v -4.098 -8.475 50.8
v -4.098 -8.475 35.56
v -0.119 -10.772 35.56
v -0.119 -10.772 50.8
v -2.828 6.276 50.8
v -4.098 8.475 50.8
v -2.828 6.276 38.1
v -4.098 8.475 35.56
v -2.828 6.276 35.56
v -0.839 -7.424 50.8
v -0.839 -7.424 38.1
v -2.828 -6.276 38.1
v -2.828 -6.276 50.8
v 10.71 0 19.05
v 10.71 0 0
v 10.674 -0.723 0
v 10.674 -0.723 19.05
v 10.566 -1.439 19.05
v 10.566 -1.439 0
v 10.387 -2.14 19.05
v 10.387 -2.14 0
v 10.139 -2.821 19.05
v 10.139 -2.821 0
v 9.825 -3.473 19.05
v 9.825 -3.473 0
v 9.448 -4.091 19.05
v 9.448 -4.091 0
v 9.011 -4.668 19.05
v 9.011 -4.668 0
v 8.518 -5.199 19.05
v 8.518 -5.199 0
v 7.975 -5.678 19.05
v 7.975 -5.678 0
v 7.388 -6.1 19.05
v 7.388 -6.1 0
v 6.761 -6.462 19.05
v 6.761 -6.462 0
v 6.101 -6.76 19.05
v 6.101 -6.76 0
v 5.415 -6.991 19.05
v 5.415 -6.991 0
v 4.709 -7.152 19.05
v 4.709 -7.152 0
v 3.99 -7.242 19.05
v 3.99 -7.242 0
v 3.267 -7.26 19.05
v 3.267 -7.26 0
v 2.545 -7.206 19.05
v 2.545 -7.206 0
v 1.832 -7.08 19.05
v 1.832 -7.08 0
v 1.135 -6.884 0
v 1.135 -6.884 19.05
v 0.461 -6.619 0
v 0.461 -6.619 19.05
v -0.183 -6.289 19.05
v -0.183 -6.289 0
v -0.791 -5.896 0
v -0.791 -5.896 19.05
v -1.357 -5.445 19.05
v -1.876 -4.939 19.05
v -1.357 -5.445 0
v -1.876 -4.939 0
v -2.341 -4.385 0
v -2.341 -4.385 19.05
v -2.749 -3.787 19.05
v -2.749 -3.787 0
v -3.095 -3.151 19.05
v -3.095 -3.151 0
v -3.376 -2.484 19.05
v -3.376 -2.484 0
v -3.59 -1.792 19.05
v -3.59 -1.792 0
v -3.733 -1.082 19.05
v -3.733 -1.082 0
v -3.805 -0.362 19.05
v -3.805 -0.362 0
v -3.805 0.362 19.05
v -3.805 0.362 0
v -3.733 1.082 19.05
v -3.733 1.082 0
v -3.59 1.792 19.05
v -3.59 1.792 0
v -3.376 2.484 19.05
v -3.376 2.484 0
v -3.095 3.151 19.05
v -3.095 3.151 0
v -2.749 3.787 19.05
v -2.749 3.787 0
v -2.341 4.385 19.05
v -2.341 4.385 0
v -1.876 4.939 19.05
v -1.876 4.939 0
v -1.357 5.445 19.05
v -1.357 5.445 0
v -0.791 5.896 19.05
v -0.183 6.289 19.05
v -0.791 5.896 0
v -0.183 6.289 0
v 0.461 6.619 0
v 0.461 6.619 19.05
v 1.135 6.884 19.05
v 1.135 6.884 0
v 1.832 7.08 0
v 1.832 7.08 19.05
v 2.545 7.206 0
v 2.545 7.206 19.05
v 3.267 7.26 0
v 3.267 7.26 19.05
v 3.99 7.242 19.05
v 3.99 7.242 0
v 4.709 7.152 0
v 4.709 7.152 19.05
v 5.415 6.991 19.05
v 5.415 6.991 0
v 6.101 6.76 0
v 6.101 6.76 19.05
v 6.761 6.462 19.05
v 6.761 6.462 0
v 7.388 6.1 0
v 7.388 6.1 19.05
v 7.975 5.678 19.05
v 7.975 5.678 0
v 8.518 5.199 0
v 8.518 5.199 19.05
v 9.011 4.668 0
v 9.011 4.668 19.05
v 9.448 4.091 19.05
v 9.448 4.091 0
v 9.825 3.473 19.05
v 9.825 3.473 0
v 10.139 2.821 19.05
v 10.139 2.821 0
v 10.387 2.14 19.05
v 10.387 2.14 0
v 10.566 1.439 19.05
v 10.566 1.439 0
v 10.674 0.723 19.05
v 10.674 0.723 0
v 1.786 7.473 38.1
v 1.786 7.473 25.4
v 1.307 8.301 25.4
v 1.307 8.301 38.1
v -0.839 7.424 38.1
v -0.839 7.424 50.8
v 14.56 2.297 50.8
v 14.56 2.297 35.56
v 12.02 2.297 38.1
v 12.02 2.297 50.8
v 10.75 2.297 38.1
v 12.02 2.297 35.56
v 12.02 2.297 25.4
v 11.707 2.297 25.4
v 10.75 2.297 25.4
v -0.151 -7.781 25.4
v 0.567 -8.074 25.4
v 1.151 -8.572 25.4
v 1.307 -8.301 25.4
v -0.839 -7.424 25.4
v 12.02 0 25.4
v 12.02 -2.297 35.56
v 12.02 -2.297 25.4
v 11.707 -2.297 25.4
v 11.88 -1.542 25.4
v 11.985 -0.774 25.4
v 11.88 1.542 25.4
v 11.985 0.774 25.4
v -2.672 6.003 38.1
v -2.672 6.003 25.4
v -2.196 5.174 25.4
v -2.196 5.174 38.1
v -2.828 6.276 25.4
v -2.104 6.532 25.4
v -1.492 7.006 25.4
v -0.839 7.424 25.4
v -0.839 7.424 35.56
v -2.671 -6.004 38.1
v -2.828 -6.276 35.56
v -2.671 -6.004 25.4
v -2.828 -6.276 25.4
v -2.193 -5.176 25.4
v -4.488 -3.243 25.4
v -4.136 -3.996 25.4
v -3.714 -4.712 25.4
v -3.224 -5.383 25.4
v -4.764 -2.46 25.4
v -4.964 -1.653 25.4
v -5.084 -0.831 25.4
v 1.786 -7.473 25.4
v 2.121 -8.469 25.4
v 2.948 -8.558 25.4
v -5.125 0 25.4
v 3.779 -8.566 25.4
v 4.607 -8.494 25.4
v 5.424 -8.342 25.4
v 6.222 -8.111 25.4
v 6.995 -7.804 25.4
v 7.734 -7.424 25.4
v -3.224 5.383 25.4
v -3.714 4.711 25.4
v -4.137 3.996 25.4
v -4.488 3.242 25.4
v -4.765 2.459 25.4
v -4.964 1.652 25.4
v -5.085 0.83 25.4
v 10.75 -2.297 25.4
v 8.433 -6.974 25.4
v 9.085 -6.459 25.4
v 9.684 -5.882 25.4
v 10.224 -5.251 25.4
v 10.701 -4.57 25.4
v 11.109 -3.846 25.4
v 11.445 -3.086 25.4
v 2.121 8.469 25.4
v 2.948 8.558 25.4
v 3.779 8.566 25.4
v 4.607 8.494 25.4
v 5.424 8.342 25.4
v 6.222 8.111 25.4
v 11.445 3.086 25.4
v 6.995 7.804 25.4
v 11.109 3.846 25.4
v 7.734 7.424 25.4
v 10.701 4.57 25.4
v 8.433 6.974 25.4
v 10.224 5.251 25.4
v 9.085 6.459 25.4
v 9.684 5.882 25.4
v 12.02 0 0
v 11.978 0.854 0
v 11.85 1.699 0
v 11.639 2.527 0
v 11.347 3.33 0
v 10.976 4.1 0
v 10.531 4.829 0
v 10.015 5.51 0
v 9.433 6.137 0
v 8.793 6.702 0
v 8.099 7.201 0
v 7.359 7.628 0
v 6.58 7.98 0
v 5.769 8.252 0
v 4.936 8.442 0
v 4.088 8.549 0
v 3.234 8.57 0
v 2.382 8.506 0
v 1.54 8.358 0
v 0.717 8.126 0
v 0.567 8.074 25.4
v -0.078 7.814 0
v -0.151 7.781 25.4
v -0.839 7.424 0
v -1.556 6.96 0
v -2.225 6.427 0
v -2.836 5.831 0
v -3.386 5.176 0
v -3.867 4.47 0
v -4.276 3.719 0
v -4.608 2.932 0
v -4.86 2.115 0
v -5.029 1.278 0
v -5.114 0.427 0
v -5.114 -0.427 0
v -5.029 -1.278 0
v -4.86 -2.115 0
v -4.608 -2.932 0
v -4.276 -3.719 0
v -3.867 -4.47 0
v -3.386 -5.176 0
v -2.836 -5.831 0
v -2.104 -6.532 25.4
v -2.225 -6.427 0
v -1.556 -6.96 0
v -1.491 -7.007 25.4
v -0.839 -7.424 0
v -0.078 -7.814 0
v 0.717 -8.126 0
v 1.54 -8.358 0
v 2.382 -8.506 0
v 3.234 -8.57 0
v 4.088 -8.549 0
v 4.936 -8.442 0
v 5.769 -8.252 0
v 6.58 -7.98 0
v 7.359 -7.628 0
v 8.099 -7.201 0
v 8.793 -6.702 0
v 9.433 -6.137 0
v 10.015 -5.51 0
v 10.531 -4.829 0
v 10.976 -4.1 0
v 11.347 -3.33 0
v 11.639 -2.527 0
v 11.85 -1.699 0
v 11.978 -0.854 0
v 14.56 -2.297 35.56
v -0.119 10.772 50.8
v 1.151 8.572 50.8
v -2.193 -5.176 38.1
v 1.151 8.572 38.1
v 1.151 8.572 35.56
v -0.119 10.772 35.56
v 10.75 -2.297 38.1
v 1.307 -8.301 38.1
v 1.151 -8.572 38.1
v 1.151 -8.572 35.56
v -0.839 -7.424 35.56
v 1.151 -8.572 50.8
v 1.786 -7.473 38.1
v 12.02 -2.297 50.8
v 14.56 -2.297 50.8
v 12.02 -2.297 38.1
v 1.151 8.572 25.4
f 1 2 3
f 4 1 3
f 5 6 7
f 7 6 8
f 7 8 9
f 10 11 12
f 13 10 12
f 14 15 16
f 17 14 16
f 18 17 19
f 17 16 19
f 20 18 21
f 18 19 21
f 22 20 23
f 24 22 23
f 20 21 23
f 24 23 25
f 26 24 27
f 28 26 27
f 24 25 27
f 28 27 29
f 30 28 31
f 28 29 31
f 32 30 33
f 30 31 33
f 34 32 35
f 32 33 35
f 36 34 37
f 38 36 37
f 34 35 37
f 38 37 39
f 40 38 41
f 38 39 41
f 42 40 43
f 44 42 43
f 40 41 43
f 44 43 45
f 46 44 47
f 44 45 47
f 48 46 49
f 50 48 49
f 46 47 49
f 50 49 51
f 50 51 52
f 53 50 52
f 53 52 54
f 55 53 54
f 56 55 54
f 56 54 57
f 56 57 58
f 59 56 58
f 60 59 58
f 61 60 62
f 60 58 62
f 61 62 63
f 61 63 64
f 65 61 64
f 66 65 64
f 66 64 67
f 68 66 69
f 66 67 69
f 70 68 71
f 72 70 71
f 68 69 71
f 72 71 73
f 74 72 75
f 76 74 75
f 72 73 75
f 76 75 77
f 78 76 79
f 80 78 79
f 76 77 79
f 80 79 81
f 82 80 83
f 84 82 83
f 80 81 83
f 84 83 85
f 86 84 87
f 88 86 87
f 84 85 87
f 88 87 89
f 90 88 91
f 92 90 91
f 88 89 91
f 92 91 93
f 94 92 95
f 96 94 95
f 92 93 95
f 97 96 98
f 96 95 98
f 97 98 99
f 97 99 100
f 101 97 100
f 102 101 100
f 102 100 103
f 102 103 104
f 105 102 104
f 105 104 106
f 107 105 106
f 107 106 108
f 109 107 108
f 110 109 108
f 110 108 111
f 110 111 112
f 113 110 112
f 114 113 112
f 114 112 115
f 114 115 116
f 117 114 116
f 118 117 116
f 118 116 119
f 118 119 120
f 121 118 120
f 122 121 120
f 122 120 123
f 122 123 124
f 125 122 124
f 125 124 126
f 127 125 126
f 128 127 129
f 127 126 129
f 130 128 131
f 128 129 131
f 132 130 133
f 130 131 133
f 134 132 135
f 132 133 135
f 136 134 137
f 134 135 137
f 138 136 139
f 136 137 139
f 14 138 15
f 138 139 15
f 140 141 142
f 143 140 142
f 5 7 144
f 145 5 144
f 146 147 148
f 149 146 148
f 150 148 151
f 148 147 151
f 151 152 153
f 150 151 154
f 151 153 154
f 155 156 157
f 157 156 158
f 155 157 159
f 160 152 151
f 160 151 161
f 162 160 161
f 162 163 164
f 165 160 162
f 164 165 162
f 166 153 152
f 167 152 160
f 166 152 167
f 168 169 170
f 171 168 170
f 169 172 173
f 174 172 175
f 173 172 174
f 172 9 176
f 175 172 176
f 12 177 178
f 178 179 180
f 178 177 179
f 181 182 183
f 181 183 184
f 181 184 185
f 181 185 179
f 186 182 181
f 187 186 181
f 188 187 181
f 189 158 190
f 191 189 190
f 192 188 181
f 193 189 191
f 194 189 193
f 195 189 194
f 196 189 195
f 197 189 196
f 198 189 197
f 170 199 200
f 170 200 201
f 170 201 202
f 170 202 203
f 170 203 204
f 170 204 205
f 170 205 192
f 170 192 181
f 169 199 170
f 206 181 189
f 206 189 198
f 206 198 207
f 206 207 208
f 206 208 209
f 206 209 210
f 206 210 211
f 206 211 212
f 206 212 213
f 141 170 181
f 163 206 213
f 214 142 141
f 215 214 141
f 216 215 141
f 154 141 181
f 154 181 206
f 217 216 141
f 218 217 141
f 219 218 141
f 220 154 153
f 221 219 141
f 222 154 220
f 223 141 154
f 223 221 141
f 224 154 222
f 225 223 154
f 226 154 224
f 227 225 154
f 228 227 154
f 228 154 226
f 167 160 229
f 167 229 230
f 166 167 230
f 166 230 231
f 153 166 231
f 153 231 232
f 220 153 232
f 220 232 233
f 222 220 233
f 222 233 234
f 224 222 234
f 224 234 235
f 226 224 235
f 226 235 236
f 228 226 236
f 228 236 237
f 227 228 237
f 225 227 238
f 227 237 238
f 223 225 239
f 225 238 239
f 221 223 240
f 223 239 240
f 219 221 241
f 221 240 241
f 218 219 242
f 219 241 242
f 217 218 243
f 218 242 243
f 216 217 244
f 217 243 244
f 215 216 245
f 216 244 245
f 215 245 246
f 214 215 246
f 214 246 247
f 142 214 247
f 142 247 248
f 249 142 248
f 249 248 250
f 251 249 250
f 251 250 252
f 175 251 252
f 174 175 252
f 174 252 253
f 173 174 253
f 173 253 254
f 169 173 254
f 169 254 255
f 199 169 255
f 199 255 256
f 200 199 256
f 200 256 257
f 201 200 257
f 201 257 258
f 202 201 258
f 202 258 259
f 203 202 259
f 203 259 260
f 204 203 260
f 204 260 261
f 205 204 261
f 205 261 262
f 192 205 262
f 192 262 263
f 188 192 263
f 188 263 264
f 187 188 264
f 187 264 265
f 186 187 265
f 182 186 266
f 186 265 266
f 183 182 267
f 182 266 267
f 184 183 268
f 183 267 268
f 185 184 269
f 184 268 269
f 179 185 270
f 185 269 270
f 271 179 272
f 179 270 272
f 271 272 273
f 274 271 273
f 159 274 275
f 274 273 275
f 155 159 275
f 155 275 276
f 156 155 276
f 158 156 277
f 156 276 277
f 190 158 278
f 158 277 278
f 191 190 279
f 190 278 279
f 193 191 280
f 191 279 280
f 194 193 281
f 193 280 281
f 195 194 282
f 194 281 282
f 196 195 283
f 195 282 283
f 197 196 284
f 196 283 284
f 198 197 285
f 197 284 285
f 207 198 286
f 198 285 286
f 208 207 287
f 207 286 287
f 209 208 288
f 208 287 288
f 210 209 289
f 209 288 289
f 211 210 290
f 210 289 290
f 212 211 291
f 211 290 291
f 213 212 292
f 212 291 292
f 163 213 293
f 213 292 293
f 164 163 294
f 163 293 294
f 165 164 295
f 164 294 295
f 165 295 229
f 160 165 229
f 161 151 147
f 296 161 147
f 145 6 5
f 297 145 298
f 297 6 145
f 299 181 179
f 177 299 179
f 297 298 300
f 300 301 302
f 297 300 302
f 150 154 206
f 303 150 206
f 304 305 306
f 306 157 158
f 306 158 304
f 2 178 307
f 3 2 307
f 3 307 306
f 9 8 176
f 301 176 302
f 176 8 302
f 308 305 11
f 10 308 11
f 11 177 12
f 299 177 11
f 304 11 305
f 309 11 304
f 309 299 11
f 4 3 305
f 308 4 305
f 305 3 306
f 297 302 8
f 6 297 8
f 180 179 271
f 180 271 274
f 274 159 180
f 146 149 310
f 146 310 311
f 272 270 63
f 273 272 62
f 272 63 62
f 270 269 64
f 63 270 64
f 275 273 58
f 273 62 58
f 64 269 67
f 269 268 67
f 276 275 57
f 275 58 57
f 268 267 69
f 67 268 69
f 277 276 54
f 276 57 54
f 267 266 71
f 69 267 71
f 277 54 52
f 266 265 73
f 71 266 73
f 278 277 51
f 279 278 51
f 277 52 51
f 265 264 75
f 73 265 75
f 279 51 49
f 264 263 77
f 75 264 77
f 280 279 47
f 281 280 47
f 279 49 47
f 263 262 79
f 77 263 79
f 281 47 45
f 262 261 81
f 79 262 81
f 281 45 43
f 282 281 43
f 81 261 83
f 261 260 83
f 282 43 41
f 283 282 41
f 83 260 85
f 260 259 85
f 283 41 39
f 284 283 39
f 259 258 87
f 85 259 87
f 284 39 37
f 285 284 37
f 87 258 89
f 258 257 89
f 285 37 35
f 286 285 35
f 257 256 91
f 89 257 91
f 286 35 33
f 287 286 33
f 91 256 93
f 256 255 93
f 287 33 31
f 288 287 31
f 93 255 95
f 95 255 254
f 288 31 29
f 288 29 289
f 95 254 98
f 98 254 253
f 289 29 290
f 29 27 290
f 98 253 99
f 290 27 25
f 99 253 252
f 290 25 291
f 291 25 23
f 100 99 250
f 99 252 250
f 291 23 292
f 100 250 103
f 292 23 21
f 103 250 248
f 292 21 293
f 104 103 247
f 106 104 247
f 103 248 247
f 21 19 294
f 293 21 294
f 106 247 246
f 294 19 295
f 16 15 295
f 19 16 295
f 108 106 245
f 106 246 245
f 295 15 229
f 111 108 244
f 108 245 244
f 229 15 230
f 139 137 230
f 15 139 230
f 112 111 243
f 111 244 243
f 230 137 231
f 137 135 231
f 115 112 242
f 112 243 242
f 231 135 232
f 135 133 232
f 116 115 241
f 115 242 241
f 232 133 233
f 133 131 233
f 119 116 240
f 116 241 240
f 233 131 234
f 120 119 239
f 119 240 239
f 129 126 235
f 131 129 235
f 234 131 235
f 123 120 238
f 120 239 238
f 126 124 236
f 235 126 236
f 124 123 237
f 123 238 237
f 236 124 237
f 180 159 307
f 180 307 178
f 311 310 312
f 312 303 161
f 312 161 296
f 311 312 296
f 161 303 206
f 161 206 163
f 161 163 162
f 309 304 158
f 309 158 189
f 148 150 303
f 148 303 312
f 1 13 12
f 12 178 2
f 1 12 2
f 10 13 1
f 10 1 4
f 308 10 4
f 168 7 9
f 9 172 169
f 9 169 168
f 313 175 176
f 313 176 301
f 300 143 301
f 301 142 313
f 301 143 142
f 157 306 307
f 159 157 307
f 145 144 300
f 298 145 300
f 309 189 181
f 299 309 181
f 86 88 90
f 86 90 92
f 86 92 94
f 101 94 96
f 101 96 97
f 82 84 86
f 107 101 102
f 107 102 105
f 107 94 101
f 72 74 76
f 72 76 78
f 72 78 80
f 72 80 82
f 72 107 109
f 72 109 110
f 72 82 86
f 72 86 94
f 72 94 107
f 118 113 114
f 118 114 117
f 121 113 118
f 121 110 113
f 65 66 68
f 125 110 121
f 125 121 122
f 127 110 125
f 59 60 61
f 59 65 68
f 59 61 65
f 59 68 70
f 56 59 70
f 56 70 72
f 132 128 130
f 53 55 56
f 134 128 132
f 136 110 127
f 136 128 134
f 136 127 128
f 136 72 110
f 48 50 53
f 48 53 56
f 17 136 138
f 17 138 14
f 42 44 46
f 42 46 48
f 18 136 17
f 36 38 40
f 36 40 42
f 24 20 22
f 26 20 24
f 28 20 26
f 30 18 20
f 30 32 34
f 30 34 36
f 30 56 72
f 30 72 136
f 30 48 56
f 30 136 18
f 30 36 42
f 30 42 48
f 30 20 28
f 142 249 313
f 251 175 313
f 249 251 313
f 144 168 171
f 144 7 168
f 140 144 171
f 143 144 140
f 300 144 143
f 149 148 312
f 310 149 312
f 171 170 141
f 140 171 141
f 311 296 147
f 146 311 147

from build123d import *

# Parameters (mm, degrees)
F0_R     = 8.5725
F1_DEPTH = 25.4
F3_DEPTH = 12.7
F4_R     = 7.261951
F5_DEPTH = 19.05
F6_DEPTH = 25.4
F7_DEPTH = 10.16


with BuildPart() as f1:
    # F0 (on Top) → F1 (new body)
    with BuildSketch(Plane.XY):
        with Locations((3.447682, 0)):
            Circle(F0_R)
    extrude(amount=F1_DEPTH)

    # F2 (on face) → F3 (join)
    with BuildSketch(Plane.XY.offset(25.4)):
        with BuildLine():
            Line((-2.192824, -5.175653), (-2.671089, -6.004032))
            ThreePointArc((-2.671089, -6.004032), (-1.803051, -6.77625), (-0.838568, -7.424003))
            ThreePointArc((-0.838568, -7.424003), (0.204643, -7.935393), (1.307422, -8.301027))
            Line((1.307422, -8.301027), (1.785687, -7.472648))
            Line((1.785687, -7.472648), (-2.192824, -5.175653))
        make_face()
        with BuildLine():
            ThreePointArc((1.307422, 8.301027), (0.204643, 7.935393), (-0.838568, 7.424003))
            ThreePointArc((-0.838568, 7.424003), (-1.803396, 6.775982), (-2.671701, 6.003408))
            Line((-2.671701, 6.003408), (-2.195779, 5.173949))
            Line((-2.195779, 5.173949), (1.785687, 7.472648))
            Line((1.785687, 7.472648), (1.307422, 8.301027))
        make_face()
        with BuildLine():
            ThreePointArc((12.020182, 0), (11.941453, 1.159143), (11.706711, 2.296994))
            Line((11.706711, 2.296994), (10.750182, 2.296994))
            Line((10.750182, 2.296994), (10.750182, -2.296994))
            Line((10.750182, -2.296994), (11.706711, -2.296994))
            ThreePointArc((11.706711, -2.296994), (11.941453, -1.159143), (12.020182, 0))
        make_face()
        with BuildLine():
            Line((12.020182, 0), (12.020182, 2.296994))
            Line((12.020182, 2.296994), (11.706711, 2.296994))
            ThreePointArc((11.706711, 2.296994), (11.941453, 1.159143), (12.020182, 0))
        make_face()
        with BuildLine():
            Line((12.020182, -2.296994), (12.020182, 0))
            ThreePointArc((12.020182, 0), (11.941453, -1.159143), (11.706711, -2.296994))
            Line((11.706711, -2.296994), (12.020182, -2.296994))
        make_face()
        with BuildLine():
            Line((-2.671089, -6.004032), (-2.827824, -6.275506))
            Line((-2.827824, -6.275506), (-0.838568, -7.424003))
            ThreePointArc((-0.838568, -7.424003), (-1.803051, -6.77625), (-2.671089, -6.004032))
        make_face()
        with BuildLine():
            ThreePointArc((1.307422, -8.301027), (0.204643, -7.935393), (-0.838568, -7.424003))
            Line((-0.838568, -7.424003), (1.150687, -8.5725))
            Line((1.150687, -8.5725), (1.307422, -8.301027))
        make_face()
        with BuildLine():
            Line((1.150687, 8.5725), (-0.838568, 7.424003))
            ThreePointArc((-0.838568, 7.424003), (0.204643, 7.935393), (1.307422, 8.301027))
            Line((1.307422, 8.301027), (1.150687, 8.5725))
        make_face()
        with BuildLine():
            Line((-0.838568, 7.424003), (-2.827824, 6.275506))
            Line((-2.827824, 6.275506), (-2.671701, 6.003408))
            ThreePointArc((-2.671701, 6.003408), (-1.803396, 6.775982), (-0.838568, 7.424003))
        make_face()
    extrude(amount=F3_DEPTH)

    # F4 (on face) → F5 (cut)
    with BuildSketch(Plane(origin=(0, 0, 0), x_dir=(1, 0, 0), z_dir=(0, 0, -1))):
        with Locations((3.447682, 0)):
            Circle(F4_R)
    extrude(amount=-F5_DEPTH, mode=Mode.SUBTRACT)

    # F2 (on face) → F6 (join)
    with BuildSketch(Plane.XY.offset(25.4)):
        Polygon((-0.838568, -7.424003), (-2.827824, -6.275506), (-4.097824, -8.47521), (-0.119313, -10.772205), (1.150687, -8.5725), align=None)
        Polygon((14.560182, 2.296994), (12.020182, 2.296994), (12.020182, 0), (12.020182, -2.296994), (14.560182, -2.296994), align=None)
        Polygon((-4.097824, 8.47521), (-2.827824, 6.275506), (-0.838568, 7.424003), (1.150687, 8.5725), (-0.119313, 10.772205), align=None)
    extrude(amount=F6_DEPTH)

    # F2 (on face) → F7 (cut)
    with BuildSketch(Plane.XY.offset(25.4)):
        Polygon((-0.838568, -7.424003), (-2.827824, -6.275506), (-4.097824, -8.47521), (-0.119313, -10.772205), (1.150687, -8.5725), align=None)
        Polygon((14.560182, 2.296994), (12.020182, 2.296994), (12.020182, 0), (12.020182, -2.296994), (14.560182, -2.296994), align=None)
        Polygon((-4.097824, 8.47521), (-2.827824, 6.275506), (-0.838568, 7.424003), (1.150687, 8.5725), (-0.119313, 10.772205), align=None)
    extrude(amount=F7_DEPTH, mode=Mode.SUBTRACT)


solid = f1.part
